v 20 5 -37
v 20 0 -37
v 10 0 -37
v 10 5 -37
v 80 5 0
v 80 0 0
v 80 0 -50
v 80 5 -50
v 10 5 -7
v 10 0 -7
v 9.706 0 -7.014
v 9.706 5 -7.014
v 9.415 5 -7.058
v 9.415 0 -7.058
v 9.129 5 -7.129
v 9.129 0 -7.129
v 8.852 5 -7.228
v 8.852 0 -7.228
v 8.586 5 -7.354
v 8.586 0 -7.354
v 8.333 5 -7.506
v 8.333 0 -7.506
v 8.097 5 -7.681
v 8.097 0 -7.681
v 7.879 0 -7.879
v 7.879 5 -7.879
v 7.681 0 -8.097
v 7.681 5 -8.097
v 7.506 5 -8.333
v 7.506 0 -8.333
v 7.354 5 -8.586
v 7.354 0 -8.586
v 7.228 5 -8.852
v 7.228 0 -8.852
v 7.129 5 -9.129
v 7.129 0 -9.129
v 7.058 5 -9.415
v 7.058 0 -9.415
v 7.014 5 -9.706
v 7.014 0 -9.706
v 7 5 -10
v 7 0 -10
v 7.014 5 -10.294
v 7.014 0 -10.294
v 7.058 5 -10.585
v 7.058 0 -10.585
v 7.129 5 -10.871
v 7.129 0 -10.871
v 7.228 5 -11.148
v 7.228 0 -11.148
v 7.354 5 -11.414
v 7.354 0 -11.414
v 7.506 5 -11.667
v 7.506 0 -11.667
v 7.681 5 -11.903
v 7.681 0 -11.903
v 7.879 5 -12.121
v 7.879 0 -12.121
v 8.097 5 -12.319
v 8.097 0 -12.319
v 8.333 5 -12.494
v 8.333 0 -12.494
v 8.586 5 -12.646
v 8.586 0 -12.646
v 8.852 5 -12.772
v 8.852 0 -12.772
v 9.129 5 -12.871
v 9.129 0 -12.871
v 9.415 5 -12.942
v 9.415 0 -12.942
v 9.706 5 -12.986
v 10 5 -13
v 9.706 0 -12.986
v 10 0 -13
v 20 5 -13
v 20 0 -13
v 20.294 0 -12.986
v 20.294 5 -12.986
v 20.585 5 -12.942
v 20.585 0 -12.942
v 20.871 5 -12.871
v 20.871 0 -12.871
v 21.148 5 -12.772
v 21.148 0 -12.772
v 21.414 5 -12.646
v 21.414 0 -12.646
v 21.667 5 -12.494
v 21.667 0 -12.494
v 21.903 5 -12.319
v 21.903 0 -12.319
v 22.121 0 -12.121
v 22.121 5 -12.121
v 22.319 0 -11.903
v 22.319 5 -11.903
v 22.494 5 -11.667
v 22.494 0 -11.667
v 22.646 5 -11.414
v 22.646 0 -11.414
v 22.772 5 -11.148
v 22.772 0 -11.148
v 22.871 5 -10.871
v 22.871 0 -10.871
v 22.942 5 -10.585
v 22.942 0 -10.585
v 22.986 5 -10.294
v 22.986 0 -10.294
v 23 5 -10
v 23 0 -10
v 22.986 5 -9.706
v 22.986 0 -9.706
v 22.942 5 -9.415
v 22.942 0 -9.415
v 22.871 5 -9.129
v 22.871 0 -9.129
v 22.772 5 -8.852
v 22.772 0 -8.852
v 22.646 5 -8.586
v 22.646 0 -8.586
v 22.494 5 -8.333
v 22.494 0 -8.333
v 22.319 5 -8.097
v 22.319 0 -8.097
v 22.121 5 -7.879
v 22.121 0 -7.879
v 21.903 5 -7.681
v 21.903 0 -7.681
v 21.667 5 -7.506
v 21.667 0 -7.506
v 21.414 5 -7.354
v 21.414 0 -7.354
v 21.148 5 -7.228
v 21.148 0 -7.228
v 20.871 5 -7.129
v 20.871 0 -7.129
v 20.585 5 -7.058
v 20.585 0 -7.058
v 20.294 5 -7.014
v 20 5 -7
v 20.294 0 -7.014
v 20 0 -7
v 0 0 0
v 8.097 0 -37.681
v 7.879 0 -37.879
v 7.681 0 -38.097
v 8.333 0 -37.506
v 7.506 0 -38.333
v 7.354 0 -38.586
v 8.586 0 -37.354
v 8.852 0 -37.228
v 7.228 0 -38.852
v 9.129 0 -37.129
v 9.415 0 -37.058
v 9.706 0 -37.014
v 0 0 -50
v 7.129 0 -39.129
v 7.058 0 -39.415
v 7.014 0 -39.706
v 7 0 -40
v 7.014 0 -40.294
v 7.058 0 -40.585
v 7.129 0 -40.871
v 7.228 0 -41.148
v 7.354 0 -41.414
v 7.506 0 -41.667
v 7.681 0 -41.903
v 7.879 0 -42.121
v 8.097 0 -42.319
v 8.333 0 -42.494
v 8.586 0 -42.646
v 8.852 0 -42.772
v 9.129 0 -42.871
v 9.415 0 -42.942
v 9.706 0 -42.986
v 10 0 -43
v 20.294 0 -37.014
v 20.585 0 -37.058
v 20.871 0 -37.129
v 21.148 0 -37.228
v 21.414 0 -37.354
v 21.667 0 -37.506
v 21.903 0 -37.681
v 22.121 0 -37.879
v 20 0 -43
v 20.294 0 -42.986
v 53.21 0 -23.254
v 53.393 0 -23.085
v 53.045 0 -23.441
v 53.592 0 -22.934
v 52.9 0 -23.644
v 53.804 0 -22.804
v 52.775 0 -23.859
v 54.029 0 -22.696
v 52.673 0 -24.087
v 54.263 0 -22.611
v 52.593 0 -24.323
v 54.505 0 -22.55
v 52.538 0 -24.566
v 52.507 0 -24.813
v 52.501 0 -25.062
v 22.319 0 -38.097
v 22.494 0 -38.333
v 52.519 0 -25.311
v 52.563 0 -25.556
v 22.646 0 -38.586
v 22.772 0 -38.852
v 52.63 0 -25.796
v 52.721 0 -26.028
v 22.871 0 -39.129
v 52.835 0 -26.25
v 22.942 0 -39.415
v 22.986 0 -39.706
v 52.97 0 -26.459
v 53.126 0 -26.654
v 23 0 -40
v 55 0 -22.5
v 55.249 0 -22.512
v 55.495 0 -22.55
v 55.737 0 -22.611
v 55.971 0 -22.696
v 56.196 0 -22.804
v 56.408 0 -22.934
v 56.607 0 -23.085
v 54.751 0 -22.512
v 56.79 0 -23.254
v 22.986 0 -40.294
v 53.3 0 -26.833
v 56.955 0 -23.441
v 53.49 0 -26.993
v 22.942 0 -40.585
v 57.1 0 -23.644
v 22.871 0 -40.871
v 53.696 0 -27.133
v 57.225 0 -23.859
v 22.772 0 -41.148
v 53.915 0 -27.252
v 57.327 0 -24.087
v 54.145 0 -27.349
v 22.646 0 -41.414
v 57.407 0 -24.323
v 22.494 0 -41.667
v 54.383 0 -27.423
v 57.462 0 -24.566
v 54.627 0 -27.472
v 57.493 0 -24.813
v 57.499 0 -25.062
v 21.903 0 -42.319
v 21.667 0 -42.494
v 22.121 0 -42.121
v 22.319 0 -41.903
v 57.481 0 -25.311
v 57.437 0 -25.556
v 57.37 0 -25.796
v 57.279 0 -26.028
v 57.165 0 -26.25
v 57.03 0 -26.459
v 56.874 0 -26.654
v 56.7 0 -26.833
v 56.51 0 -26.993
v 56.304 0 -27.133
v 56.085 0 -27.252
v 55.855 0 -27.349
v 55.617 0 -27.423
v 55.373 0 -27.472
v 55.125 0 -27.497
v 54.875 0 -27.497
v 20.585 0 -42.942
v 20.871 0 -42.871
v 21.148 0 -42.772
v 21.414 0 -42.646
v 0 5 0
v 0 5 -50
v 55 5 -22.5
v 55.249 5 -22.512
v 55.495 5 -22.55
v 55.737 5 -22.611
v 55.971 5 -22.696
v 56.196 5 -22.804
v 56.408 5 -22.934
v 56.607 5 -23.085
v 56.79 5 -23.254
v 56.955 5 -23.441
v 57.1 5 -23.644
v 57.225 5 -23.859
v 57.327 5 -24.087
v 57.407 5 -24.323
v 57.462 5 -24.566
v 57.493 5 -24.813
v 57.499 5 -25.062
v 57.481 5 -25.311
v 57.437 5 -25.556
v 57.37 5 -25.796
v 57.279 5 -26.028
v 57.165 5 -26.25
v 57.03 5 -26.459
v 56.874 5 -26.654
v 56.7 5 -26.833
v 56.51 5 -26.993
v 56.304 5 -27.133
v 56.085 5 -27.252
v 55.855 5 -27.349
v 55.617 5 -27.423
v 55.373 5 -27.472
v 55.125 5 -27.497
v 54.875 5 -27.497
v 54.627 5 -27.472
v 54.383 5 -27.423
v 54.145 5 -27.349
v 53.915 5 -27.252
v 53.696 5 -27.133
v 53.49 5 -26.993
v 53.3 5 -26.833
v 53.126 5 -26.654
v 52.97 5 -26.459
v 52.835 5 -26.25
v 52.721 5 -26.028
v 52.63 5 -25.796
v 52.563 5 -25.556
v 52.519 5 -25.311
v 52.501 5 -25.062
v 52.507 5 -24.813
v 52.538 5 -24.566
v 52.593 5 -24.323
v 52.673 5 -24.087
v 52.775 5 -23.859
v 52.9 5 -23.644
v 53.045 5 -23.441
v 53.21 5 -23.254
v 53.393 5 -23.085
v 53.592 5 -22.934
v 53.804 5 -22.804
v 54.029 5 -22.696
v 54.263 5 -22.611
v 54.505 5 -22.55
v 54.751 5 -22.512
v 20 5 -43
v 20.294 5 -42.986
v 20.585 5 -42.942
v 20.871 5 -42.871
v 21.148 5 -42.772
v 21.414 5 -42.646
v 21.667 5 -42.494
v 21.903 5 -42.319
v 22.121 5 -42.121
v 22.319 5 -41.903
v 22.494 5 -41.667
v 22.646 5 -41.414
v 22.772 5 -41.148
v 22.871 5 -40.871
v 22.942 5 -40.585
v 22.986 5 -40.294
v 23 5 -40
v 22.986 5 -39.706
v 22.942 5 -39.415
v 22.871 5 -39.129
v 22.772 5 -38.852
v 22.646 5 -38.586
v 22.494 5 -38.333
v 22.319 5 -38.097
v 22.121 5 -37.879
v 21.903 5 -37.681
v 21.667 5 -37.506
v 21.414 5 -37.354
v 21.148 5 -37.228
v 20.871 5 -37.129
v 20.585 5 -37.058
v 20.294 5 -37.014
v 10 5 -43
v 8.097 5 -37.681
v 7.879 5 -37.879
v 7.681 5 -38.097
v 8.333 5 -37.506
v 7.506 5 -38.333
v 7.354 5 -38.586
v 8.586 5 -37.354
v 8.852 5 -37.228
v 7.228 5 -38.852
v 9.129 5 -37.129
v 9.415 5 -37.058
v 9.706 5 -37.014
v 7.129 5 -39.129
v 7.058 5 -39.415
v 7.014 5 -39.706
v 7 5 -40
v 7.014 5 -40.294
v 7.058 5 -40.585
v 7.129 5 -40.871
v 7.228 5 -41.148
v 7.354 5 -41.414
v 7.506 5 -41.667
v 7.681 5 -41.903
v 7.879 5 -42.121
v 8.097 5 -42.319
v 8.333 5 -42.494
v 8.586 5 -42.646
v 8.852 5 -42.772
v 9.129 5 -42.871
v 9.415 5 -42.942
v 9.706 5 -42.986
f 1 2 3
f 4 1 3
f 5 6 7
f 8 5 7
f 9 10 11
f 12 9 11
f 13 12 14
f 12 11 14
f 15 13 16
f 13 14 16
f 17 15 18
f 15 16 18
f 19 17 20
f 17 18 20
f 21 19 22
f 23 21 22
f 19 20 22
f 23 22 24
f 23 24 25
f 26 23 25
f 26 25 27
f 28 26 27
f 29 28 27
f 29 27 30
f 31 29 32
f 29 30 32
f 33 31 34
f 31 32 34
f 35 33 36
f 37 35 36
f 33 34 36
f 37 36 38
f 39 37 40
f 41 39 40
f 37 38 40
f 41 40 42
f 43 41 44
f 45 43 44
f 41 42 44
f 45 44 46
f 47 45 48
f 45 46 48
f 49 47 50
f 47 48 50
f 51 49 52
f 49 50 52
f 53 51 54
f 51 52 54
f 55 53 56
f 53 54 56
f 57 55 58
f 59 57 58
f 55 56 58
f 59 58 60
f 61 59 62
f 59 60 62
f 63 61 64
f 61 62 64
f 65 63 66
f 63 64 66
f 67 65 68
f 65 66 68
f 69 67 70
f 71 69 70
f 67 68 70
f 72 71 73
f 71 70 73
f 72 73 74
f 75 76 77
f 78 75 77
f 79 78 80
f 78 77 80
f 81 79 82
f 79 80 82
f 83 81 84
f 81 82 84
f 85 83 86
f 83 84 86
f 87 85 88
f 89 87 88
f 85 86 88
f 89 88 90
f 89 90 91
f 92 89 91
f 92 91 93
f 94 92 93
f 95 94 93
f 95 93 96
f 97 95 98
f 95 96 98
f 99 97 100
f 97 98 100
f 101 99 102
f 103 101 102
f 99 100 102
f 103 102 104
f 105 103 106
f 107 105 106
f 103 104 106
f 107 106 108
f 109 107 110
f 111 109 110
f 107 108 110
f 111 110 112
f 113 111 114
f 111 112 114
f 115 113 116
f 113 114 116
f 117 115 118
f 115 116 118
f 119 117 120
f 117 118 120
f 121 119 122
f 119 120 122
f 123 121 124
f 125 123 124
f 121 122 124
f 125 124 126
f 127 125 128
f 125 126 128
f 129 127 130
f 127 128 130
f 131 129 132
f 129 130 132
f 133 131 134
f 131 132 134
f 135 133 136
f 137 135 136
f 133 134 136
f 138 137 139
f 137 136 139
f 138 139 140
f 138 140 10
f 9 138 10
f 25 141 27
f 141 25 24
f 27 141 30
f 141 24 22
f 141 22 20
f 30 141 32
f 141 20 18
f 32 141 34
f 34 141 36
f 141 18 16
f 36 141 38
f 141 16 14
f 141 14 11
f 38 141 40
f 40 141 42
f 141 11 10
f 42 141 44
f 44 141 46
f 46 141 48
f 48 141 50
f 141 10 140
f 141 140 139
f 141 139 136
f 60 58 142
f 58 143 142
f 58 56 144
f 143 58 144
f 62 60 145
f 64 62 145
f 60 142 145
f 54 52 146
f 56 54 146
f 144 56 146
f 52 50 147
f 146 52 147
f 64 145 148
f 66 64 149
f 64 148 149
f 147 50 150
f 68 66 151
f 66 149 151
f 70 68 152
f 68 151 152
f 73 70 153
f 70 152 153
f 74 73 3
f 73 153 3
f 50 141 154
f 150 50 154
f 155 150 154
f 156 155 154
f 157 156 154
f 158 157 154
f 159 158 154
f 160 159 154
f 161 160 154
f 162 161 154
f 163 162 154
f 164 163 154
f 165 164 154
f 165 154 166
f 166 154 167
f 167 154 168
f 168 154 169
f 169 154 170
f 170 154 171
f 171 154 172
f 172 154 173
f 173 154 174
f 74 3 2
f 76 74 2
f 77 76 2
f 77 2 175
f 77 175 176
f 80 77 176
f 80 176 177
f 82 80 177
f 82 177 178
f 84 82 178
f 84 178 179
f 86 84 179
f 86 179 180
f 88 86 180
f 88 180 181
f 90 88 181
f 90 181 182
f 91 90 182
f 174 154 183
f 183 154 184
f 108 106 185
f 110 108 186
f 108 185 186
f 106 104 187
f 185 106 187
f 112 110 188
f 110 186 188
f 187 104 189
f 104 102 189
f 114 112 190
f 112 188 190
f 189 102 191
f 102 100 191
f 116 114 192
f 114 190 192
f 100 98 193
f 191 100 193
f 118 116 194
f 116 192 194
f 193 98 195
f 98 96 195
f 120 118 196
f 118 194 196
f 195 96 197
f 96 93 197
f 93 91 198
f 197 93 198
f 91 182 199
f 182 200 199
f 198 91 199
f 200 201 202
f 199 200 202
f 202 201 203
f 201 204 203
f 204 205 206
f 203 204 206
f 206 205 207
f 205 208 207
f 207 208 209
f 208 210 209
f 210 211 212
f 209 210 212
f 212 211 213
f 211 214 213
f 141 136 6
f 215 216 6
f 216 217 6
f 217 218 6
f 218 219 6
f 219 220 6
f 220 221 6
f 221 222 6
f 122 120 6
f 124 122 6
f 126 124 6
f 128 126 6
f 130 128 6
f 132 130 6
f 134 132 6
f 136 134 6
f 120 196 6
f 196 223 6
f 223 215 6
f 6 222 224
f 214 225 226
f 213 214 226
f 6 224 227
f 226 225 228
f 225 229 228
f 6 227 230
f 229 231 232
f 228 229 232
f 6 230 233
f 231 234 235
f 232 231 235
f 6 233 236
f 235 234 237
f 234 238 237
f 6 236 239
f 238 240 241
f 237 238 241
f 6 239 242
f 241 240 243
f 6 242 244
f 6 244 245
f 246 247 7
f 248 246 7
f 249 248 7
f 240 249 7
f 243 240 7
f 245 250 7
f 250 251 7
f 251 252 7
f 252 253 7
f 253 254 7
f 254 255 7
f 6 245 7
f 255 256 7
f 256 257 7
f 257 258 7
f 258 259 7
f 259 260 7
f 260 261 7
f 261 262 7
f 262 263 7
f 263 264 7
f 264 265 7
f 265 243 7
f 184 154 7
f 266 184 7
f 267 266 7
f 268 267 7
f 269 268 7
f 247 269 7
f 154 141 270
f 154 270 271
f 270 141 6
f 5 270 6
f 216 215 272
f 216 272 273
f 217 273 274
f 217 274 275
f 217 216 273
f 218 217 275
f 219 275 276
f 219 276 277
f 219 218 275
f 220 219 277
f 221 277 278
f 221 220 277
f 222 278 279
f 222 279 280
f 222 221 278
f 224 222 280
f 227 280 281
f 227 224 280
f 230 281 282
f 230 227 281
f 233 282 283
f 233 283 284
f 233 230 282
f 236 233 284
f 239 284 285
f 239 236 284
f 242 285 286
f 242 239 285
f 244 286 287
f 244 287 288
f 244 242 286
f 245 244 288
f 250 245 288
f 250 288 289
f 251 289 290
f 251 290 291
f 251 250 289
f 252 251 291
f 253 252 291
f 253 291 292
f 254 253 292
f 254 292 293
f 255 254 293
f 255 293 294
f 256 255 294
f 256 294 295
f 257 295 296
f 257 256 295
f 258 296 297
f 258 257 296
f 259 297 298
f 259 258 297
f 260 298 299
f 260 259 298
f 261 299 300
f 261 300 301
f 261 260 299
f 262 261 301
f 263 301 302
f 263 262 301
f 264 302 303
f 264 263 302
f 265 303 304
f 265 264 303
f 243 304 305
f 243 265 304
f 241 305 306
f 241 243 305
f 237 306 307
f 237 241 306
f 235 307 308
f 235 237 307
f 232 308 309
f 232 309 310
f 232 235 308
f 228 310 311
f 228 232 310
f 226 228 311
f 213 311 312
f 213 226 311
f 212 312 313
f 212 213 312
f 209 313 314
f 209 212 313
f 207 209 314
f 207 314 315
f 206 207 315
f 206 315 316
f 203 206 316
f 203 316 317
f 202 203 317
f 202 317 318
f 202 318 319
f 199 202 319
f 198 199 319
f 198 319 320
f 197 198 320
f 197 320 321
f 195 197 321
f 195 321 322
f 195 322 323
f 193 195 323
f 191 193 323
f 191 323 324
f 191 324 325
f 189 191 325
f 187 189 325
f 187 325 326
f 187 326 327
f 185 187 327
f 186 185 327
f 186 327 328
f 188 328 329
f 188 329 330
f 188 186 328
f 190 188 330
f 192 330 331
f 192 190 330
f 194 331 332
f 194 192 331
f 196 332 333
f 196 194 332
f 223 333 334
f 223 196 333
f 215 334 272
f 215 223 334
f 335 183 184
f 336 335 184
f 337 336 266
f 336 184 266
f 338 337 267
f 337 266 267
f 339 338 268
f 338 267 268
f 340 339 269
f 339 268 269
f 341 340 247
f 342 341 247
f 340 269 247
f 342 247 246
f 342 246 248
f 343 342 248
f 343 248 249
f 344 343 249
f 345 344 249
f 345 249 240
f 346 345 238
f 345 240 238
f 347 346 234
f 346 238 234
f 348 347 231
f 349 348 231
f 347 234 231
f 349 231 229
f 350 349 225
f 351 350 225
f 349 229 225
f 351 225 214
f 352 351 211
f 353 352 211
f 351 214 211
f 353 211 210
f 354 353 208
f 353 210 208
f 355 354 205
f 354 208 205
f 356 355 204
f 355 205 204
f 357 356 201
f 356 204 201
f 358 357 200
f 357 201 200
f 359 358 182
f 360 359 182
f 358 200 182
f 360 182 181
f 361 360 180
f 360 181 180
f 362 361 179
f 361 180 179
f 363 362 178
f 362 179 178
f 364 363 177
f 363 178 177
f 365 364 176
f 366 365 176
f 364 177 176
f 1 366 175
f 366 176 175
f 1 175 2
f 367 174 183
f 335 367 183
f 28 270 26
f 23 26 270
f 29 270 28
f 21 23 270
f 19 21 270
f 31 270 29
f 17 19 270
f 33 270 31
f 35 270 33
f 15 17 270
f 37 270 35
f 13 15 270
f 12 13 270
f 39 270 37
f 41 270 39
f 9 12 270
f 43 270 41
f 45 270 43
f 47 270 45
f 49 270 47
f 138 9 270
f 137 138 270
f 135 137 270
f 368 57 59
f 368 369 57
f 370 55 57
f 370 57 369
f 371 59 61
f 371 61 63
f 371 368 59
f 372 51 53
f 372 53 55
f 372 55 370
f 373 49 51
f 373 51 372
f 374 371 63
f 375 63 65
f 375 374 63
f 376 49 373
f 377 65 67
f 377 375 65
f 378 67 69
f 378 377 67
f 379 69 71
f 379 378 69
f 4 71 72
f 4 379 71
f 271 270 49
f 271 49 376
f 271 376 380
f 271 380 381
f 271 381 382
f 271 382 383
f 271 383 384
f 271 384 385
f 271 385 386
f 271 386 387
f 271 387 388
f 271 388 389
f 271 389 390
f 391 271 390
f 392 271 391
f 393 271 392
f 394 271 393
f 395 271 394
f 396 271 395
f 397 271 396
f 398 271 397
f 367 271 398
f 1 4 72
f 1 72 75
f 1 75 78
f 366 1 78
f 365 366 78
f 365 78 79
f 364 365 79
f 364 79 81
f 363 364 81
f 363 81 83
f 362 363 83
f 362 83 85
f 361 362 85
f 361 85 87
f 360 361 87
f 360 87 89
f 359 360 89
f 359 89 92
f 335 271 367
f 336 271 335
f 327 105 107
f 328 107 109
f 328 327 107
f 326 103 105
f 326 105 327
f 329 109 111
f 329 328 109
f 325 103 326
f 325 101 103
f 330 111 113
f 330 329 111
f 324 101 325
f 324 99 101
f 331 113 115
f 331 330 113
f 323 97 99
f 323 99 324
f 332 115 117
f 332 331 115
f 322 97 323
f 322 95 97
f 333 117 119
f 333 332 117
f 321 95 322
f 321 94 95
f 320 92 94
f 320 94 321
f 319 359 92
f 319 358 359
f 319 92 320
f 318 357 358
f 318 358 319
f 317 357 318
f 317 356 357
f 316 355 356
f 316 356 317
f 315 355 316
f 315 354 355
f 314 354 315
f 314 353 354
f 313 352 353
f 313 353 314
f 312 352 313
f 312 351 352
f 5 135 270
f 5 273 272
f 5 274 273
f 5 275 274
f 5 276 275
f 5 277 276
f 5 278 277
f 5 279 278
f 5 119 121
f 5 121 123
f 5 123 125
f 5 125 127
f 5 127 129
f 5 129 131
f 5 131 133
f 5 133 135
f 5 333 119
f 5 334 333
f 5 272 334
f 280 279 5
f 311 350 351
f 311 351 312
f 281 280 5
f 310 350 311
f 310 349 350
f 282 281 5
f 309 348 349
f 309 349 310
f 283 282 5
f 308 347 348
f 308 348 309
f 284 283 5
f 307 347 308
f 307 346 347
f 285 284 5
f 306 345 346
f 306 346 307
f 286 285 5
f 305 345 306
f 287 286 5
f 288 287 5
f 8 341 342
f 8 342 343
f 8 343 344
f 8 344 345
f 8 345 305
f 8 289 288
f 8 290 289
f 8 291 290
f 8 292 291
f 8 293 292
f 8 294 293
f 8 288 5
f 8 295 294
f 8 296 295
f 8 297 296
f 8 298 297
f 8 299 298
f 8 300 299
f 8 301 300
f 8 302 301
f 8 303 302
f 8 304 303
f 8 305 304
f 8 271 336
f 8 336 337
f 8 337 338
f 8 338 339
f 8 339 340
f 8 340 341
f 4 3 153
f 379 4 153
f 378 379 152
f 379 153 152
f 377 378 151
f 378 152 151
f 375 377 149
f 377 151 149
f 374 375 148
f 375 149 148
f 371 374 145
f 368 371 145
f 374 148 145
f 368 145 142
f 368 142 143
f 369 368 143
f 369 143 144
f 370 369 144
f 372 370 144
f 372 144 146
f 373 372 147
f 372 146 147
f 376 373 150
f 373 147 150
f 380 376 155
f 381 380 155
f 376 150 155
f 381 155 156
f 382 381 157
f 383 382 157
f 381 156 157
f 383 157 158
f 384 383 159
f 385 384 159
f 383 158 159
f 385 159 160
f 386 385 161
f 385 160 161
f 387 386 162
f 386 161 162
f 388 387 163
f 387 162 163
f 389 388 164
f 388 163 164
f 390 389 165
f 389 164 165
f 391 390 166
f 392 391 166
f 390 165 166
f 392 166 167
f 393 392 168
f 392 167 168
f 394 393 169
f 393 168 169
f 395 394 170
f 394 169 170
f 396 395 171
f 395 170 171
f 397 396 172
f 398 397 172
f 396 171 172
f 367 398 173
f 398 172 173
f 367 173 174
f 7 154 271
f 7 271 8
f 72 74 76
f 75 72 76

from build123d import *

# Parameters (mm, degrees)
SKETCH1_W           = 80
SKETCH1_H           = 50
SKETCH1_R           = 2.5
BOSS_EXTRUDE1_DEPTH = 5


with BuildPart() as part:
    # Sketch1 → Boss-Extrude1 (new body)
    with BuildSketch(Plane(origin=(0, 0, 0), x_dir=(1, 0, 0), z_dir=(0, 1, 0))):
        with Locations((40, 25)):
            Rectangle(SKETCH1_W, SKETCH1_H)
        with Locations(Location((55, 25, 0), (0, 0, 270))):
            Circle(SKETCH1_R, mode=Mode.SUBTRACT)
        with BuildLine():
            Line((10, 43), (20, 43))
            ThreePointArc((20, 43), (23, 40), (20, 37))
            Line((20, 37), (10, 37))
            ThreePointArc((10, 37), (7, 40), (10, 43))
        make_face(mode=Mode.SUBTRACT)
        with BuildLine():
            Line((10, 13), (20, 13))
            ThreePointArc((20, 13), (23, 10), (20, 7))
            Line((20, 7), (10, 7))
            ThreePointArc((10, 7), (7, 10), (10, 13))
        make_face(mode=Mode.SUBTRACT)
    extrude(amount=BOSS_EXTRUDE1_DEPTH)


solid = part.part
